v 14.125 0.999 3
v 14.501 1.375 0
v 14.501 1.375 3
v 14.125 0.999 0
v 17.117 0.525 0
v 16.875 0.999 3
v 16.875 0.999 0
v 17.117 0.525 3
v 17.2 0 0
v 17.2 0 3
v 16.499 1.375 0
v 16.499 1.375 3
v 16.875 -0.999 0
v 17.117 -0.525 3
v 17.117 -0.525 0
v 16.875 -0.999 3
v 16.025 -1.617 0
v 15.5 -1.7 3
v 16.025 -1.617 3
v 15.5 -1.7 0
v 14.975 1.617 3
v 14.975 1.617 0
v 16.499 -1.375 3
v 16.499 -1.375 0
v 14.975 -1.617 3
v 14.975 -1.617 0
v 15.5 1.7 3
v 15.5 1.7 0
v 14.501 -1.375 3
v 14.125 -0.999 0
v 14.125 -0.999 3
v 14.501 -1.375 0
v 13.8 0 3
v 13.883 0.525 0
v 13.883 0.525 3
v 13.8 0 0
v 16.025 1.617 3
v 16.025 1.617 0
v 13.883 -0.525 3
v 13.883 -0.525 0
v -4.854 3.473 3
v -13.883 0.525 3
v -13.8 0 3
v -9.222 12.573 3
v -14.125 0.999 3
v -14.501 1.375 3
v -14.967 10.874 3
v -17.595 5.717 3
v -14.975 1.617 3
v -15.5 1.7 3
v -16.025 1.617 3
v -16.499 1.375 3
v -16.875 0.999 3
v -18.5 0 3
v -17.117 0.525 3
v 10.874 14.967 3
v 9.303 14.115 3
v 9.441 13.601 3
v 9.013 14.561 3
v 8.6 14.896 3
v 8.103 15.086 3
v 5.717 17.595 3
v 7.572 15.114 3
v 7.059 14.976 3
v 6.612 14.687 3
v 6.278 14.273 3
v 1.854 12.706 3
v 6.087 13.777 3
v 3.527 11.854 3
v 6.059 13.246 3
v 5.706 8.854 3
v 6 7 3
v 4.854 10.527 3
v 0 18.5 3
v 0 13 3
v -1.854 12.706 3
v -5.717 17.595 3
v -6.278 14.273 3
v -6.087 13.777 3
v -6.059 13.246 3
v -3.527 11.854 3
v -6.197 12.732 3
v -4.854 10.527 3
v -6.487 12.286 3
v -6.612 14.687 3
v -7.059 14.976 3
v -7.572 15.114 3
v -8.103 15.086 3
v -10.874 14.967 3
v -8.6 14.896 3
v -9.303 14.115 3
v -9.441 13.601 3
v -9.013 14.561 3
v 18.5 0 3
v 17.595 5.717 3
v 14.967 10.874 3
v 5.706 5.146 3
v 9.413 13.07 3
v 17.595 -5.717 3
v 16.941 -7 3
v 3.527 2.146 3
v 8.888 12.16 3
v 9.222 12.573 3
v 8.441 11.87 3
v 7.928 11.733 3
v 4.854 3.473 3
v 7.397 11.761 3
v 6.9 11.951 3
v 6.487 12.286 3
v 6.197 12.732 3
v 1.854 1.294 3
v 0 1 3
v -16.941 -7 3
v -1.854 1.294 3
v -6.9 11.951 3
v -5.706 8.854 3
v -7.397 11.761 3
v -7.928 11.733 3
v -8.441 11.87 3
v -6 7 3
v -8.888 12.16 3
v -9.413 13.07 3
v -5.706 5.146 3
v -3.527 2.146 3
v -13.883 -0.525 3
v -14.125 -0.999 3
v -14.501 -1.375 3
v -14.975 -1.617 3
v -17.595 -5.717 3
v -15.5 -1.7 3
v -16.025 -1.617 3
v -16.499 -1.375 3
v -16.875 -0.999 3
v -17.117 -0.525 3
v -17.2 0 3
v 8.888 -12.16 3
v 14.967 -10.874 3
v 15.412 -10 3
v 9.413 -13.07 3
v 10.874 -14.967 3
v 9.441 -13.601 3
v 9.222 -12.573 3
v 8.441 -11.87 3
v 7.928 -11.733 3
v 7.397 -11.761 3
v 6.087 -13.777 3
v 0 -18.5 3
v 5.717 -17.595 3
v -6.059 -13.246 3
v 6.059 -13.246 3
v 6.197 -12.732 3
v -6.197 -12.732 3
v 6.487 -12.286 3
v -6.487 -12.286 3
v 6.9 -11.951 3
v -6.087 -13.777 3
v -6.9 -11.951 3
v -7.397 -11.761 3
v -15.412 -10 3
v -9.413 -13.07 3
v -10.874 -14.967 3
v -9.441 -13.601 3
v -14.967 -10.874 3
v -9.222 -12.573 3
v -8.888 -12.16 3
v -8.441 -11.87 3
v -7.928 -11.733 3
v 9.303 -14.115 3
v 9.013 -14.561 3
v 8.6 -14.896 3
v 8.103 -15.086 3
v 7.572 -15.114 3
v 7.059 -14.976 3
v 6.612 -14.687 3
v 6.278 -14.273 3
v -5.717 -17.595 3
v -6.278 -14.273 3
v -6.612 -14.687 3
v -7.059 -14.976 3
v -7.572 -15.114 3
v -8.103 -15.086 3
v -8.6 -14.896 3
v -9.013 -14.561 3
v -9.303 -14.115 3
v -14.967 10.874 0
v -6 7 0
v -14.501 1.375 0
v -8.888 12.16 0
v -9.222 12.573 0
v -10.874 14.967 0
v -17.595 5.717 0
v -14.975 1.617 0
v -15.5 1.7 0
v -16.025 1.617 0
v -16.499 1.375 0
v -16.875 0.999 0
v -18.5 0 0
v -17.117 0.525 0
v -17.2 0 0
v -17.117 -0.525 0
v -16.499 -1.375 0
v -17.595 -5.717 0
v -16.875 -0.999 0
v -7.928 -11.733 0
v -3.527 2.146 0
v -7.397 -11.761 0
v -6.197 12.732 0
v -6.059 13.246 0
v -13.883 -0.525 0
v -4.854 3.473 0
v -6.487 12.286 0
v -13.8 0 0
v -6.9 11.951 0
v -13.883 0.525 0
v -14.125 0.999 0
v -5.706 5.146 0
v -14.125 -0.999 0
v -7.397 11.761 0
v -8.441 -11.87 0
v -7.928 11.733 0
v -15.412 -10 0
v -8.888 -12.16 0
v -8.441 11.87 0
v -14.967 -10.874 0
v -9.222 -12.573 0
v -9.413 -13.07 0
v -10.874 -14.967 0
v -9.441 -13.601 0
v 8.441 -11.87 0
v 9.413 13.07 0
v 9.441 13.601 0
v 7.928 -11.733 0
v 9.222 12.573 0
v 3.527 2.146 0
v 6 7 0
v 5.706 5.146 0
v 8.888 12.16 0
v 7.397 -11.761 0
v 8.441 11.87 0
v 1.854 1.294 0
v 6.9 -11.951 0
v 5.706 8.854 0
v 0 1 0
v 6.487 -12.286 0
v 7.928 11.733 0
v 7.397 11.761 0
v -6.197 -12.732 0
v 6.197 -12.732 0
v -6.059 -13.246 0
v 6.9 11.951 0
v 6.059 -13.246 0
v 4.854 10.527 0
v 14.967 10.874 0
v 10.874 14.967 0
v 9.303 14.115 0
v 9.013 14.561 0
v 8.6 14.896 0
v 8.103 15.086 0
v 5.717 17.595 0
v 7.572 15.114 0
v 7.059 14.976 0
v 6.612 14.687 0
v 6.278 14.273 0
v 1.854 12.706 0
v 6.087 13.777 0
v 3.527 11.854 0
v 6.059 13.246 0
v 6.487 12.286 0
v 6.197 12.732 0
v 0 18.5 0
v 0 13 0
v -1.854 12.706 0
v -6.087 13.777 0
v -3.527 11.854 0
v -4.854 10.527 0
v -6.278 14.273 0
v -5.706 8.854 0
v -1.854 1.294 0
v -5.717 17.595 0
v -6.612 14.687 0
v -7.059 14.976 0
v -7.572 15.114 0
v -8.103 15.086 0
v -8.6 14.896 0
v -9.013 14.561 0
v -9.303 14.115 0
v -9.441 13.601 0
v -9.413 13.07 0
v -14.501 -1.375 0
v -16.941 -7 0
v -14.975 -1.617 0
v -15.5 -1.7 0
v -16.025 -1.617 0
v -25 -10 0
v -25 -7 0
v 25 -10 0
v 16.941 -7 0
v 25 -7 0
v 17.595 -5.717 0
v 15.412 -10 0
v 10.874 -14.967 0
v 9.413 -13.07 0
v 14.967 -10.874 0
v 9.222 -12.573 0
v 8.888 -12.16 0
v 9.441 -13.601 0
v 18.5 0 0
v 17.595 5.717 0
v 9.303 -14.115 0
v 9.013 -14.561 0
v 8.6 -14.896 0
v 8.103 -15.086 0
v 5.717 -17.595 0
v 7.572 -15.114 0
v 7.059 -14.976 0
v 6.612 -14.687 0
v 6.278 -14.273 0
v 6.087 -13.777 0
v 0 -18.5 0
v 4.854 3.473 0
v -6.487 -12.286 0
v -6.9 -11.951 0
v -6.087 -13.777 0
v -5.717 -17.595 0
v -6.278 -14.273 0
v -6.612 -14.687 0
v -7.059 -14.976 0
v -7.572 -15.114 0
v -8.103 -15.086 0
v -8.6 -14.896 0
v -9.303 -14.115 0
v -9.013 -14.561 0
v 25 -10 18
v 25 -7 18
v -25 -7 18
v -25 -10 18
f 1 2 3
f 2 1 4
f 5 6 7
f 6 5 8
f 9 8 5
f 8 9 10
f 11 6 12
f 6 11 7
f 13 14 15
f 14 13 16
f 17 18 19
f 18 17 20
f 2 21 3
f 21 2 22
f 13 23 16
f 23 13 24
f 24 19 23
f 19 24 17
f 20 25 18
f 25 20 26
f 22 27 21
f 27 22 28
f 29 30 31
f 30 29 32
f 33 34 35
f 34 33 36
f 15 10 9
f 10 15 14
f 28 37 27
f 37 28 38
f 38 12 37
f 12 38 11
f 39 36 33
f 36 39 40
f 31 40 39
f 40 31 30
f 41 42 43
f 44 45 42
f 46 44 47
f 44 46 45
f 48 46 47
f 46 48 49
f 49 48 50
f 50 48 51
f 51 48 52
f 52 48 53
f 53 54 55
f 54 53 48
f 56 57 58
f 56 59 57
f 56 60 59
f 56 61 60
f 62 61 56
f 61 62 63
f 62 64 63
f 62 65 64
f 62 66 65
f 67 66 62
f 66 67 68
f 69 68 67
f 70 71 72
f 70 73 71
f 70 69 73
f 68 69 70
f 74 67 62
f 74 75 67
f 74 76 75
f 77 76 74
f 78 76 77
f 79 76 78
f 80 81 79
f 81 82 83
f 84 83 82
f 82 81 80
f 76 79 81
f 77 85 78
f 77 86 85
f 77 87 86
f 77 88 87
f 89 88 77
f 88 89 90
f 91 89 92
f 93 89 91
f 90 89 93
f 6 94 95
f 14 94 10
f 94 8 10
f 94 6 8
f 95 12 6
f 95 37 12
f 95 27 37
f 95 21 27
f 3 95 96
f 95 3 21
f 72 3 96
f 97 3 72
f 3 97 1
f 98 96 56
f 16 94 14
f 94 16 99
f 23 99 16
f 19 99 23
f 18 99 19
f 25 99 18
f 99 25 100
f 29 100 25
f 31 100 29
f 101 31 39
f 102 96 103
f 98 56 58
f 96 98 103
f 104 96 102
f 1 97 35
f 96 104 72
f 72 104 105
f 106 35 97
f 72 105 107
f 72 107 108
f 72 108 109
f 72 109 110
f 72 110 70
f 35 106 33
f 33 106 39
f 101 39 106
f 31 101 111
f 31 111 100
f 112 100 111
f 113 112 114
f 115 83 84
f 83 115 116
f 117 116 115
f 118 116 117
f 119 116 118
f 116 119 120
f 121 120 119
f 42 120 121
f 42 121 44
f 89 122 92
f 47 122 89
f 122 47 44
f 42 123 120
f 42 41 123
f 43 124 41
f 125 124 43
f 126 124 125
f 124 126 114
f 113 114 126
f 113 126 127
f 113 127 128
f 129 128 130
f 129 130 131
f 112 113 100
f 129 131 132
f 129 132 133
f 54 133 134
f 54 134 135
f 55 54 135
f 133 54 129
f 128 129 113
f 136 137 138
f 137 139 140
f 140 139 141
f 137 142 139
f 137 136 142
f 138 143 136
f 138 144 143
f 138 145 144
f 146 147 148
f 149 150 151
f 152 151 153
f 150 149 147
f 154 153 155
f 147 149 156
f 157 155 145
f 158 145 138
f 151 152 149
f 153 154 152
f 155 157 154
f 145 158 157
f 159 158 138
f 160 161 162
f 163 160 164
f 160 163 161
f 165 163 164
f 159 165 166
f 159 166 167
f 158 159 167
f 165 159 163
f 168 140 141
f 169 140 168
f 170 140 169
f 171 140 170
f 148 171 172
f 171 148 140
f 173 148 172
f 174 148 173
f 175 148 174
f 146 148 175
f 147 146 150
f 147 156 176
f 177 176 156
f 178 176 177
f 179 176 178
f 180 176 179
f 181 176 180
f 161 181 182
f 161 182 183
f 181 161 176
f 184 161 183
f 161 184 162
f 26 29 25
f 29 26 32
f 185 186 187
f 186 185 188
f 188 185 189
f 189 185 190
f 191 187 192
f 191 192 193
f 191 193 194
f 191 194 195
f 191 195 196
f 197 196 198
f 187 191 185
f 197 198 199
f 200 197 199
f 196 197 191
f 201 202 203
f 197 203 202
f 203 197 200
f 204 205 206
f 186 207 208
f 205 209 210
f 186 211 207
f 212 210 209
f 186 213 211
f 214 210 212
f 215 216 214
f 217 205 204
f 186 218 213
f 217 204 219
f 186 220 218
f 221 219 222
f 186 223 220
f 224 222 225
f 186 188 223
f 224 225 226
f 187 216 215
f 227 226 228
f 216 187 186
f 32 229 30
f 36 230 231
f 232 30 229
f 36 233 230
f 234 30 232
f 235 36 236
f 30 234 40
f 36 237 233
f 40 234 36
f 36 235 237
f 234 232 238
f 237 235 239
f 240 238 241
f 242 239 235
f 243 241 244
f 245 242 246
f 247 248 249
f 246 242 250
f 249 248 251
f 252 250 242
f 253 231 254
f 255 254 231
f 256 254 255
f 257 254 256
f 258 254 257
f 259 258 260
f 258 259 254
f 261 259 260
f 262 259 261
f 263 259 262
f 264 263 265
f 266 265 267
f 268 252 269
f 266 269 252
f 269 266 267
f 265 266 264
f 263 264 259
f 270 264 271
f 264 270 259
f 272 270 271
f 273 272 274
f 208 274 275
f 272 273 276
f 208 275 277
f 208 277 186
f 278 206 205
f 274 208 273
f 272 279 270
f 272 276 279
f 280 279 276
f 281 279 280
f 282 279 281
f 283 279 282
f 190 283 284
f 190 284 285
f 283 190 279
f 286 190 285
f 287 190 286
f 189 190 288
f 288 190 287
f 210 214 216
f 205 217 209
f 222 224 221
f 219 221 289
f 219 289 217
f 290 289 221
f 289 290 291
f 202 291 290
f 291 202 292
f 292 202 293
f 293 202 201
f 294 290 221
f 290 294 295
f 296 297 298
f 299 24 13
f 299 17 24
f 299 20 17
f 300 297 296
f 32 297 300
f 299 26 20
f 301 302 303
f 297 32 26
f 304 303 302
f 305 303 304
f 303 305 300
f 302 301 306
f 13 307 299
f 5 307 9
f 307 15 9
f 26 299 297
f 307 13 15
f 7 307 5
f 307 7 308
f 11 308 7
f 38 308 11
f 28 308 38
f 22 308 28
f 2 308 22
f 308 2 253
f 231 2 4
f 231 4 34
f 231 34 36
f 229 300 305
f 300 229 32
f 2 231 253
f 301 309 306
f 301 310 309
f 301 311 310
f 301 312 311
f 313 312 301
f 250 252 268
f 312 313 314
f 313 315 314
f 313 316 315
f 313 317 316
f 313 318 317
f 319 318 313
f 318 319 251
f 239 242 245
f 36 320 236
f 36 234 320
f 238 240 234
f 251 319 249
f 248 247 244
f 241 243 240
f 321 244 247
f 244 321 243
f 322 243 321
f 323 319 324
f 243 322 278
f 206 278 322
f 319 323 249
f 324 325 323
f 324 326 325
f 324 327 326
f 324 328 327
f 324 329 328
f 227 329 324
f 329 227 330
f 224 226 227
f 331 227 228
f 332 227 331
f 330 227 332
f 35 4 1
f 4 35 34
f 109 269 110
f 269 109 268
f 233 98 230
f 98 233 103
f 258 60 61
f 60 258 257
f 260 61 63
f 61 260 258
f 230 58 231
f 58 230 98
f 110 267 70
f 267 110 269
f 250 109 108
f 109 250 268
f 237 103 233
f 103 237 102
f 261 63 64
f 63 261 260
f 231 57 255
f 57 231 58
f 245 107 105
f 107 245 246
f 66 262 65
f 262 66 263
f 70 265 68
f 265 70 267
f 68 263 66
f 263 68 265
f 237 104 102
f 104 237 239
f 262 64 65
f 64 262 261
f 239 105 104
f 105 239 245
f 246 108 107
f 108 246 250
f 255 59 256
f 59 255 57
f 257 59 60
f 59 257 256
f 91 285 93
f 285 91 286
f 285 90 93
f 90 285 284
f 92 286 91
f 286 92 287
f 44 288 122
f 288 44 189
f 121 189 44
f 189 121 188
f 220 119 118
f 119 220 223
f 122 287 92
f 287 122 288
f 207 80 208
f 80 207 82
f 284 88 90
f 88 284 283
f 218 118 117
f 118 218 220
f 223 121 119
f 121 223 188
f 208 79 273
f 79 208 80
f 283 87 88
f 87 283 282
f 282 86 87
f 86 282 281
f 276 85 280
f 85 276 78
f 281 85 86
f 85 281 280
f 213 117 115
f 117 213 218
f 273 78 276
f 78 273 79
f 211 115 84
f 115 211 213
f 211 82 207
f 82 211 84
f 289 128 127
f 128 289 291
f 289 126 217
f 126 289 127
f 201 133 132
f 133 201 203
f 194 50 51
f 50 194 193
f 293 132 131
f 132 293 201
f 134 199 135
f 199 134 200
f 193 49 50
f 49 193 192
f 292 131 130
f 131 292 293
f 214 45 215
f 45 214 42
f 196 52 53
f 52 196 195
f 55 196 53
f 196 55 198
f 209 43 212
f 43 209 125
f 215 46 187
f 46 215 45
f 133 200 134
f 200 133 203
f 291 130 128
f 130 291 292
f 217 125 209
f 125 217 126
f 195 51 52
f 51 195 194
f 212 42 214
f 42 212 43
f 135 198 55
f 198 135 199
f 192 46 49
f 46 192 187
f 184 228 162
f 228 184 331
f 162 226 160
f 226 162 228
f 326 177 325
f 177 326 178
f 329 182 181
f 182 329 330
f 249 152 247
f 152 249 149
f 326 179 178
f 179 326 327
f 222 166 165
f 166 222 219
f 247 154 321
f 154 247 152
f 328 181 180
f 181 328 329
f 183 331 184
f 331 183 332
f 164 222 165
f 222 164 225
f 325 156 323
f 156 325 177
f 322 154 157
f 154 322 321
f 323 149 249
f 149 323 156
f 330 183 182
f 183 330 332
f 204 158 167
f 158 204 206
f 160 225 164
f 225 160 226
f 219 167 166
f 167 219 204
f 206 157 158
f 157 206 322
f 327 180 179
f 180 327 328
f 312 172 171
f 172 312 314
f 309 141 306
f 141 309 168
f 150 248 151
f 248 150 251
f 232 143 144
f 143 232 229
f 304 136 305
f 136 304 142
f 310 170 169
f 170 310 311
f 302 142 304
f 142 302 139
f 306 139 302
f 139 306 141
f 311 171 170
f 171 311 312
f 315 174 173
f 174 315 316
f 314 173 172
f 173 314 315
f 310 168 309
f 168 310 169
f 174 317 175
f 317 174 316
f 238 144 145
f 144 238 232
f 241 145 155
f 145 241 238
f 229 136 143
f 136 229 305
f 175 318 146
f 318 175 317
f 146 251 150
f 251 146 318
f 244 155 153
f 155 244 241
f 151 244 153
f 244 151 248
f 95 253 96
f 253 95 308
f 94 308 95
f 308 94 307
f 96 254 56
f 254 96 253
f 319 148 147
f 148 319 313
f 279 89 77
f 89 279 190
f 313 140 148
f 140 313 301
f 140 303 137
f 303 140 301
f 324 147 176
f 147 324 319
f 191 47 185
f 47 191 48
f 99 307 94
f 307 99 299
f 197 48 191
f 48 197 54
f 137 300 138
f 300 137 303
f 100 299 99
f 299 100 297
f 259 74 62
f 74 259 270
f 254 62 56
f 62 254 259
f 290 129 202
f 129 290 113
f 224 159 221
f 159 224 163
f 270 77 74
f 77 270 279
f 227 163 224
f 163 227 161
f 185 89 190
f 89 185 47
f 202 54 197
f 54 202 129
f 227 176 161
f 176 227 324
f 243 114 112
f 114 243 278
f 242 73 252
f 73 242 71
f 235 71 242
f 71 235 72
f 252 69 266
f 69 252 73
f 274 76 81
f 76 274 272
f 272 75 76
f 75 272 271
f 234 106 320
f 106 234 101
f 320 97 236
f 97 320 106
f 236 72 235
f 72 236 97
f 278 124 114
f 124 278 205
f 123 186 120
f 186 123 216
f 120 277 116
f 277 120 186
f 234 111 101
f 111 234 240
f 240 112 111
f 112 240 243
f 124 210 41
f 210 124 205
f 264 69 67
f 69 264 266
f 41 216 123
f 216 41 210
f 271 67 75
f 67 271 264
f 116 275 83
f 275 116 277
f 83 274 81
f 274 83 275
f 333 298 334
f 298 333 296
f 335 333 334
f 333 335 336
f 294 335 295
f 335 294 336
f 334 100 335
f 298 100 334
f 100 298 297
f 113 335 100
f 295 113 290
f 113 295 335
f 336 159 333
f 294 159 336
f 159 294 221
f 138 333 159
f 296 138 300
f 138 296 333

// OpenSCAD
// axe moteur peinture

support();

module support()
{
ep=3;

d1=12;
d3=37;
daxe=7;

dv=31;

x=50;
z=18;

difference()
{
    cylinder(ep,d3/2,d3/2,$fn=20);
    translate([0,daxe,0]) cylinder(ep,d1/2,d1/2,$fn=20);
    for(i=[0:1:5])
        rotate([0,0,i*360/6]) translate([dv/2,0,0]) cylinder(ep,1.7,1.7,$fn=20);
}

translate([-x/2,-10,0]) cube([x,ep,z]);


}



module manchon()
{

d1=6;
d2=6.75;

h1=12;
h2=12;

de=14;

c=5.6;


difference()
{
    cylinder(h1+h2,de/2,de/2,$fn=20);
    cylinder(h1,d1/2,d1/2,$fn=20);
    translate([0,0,h1]) cylinder(h2,d2/2,d2/2,$fn=20);
} 
intersection()
{
    cylinder(h1,de/2,de/2,$fn=20);
    translate([c-d1/2,-de/2,0]) cube([de,de,h1]);
}

}
